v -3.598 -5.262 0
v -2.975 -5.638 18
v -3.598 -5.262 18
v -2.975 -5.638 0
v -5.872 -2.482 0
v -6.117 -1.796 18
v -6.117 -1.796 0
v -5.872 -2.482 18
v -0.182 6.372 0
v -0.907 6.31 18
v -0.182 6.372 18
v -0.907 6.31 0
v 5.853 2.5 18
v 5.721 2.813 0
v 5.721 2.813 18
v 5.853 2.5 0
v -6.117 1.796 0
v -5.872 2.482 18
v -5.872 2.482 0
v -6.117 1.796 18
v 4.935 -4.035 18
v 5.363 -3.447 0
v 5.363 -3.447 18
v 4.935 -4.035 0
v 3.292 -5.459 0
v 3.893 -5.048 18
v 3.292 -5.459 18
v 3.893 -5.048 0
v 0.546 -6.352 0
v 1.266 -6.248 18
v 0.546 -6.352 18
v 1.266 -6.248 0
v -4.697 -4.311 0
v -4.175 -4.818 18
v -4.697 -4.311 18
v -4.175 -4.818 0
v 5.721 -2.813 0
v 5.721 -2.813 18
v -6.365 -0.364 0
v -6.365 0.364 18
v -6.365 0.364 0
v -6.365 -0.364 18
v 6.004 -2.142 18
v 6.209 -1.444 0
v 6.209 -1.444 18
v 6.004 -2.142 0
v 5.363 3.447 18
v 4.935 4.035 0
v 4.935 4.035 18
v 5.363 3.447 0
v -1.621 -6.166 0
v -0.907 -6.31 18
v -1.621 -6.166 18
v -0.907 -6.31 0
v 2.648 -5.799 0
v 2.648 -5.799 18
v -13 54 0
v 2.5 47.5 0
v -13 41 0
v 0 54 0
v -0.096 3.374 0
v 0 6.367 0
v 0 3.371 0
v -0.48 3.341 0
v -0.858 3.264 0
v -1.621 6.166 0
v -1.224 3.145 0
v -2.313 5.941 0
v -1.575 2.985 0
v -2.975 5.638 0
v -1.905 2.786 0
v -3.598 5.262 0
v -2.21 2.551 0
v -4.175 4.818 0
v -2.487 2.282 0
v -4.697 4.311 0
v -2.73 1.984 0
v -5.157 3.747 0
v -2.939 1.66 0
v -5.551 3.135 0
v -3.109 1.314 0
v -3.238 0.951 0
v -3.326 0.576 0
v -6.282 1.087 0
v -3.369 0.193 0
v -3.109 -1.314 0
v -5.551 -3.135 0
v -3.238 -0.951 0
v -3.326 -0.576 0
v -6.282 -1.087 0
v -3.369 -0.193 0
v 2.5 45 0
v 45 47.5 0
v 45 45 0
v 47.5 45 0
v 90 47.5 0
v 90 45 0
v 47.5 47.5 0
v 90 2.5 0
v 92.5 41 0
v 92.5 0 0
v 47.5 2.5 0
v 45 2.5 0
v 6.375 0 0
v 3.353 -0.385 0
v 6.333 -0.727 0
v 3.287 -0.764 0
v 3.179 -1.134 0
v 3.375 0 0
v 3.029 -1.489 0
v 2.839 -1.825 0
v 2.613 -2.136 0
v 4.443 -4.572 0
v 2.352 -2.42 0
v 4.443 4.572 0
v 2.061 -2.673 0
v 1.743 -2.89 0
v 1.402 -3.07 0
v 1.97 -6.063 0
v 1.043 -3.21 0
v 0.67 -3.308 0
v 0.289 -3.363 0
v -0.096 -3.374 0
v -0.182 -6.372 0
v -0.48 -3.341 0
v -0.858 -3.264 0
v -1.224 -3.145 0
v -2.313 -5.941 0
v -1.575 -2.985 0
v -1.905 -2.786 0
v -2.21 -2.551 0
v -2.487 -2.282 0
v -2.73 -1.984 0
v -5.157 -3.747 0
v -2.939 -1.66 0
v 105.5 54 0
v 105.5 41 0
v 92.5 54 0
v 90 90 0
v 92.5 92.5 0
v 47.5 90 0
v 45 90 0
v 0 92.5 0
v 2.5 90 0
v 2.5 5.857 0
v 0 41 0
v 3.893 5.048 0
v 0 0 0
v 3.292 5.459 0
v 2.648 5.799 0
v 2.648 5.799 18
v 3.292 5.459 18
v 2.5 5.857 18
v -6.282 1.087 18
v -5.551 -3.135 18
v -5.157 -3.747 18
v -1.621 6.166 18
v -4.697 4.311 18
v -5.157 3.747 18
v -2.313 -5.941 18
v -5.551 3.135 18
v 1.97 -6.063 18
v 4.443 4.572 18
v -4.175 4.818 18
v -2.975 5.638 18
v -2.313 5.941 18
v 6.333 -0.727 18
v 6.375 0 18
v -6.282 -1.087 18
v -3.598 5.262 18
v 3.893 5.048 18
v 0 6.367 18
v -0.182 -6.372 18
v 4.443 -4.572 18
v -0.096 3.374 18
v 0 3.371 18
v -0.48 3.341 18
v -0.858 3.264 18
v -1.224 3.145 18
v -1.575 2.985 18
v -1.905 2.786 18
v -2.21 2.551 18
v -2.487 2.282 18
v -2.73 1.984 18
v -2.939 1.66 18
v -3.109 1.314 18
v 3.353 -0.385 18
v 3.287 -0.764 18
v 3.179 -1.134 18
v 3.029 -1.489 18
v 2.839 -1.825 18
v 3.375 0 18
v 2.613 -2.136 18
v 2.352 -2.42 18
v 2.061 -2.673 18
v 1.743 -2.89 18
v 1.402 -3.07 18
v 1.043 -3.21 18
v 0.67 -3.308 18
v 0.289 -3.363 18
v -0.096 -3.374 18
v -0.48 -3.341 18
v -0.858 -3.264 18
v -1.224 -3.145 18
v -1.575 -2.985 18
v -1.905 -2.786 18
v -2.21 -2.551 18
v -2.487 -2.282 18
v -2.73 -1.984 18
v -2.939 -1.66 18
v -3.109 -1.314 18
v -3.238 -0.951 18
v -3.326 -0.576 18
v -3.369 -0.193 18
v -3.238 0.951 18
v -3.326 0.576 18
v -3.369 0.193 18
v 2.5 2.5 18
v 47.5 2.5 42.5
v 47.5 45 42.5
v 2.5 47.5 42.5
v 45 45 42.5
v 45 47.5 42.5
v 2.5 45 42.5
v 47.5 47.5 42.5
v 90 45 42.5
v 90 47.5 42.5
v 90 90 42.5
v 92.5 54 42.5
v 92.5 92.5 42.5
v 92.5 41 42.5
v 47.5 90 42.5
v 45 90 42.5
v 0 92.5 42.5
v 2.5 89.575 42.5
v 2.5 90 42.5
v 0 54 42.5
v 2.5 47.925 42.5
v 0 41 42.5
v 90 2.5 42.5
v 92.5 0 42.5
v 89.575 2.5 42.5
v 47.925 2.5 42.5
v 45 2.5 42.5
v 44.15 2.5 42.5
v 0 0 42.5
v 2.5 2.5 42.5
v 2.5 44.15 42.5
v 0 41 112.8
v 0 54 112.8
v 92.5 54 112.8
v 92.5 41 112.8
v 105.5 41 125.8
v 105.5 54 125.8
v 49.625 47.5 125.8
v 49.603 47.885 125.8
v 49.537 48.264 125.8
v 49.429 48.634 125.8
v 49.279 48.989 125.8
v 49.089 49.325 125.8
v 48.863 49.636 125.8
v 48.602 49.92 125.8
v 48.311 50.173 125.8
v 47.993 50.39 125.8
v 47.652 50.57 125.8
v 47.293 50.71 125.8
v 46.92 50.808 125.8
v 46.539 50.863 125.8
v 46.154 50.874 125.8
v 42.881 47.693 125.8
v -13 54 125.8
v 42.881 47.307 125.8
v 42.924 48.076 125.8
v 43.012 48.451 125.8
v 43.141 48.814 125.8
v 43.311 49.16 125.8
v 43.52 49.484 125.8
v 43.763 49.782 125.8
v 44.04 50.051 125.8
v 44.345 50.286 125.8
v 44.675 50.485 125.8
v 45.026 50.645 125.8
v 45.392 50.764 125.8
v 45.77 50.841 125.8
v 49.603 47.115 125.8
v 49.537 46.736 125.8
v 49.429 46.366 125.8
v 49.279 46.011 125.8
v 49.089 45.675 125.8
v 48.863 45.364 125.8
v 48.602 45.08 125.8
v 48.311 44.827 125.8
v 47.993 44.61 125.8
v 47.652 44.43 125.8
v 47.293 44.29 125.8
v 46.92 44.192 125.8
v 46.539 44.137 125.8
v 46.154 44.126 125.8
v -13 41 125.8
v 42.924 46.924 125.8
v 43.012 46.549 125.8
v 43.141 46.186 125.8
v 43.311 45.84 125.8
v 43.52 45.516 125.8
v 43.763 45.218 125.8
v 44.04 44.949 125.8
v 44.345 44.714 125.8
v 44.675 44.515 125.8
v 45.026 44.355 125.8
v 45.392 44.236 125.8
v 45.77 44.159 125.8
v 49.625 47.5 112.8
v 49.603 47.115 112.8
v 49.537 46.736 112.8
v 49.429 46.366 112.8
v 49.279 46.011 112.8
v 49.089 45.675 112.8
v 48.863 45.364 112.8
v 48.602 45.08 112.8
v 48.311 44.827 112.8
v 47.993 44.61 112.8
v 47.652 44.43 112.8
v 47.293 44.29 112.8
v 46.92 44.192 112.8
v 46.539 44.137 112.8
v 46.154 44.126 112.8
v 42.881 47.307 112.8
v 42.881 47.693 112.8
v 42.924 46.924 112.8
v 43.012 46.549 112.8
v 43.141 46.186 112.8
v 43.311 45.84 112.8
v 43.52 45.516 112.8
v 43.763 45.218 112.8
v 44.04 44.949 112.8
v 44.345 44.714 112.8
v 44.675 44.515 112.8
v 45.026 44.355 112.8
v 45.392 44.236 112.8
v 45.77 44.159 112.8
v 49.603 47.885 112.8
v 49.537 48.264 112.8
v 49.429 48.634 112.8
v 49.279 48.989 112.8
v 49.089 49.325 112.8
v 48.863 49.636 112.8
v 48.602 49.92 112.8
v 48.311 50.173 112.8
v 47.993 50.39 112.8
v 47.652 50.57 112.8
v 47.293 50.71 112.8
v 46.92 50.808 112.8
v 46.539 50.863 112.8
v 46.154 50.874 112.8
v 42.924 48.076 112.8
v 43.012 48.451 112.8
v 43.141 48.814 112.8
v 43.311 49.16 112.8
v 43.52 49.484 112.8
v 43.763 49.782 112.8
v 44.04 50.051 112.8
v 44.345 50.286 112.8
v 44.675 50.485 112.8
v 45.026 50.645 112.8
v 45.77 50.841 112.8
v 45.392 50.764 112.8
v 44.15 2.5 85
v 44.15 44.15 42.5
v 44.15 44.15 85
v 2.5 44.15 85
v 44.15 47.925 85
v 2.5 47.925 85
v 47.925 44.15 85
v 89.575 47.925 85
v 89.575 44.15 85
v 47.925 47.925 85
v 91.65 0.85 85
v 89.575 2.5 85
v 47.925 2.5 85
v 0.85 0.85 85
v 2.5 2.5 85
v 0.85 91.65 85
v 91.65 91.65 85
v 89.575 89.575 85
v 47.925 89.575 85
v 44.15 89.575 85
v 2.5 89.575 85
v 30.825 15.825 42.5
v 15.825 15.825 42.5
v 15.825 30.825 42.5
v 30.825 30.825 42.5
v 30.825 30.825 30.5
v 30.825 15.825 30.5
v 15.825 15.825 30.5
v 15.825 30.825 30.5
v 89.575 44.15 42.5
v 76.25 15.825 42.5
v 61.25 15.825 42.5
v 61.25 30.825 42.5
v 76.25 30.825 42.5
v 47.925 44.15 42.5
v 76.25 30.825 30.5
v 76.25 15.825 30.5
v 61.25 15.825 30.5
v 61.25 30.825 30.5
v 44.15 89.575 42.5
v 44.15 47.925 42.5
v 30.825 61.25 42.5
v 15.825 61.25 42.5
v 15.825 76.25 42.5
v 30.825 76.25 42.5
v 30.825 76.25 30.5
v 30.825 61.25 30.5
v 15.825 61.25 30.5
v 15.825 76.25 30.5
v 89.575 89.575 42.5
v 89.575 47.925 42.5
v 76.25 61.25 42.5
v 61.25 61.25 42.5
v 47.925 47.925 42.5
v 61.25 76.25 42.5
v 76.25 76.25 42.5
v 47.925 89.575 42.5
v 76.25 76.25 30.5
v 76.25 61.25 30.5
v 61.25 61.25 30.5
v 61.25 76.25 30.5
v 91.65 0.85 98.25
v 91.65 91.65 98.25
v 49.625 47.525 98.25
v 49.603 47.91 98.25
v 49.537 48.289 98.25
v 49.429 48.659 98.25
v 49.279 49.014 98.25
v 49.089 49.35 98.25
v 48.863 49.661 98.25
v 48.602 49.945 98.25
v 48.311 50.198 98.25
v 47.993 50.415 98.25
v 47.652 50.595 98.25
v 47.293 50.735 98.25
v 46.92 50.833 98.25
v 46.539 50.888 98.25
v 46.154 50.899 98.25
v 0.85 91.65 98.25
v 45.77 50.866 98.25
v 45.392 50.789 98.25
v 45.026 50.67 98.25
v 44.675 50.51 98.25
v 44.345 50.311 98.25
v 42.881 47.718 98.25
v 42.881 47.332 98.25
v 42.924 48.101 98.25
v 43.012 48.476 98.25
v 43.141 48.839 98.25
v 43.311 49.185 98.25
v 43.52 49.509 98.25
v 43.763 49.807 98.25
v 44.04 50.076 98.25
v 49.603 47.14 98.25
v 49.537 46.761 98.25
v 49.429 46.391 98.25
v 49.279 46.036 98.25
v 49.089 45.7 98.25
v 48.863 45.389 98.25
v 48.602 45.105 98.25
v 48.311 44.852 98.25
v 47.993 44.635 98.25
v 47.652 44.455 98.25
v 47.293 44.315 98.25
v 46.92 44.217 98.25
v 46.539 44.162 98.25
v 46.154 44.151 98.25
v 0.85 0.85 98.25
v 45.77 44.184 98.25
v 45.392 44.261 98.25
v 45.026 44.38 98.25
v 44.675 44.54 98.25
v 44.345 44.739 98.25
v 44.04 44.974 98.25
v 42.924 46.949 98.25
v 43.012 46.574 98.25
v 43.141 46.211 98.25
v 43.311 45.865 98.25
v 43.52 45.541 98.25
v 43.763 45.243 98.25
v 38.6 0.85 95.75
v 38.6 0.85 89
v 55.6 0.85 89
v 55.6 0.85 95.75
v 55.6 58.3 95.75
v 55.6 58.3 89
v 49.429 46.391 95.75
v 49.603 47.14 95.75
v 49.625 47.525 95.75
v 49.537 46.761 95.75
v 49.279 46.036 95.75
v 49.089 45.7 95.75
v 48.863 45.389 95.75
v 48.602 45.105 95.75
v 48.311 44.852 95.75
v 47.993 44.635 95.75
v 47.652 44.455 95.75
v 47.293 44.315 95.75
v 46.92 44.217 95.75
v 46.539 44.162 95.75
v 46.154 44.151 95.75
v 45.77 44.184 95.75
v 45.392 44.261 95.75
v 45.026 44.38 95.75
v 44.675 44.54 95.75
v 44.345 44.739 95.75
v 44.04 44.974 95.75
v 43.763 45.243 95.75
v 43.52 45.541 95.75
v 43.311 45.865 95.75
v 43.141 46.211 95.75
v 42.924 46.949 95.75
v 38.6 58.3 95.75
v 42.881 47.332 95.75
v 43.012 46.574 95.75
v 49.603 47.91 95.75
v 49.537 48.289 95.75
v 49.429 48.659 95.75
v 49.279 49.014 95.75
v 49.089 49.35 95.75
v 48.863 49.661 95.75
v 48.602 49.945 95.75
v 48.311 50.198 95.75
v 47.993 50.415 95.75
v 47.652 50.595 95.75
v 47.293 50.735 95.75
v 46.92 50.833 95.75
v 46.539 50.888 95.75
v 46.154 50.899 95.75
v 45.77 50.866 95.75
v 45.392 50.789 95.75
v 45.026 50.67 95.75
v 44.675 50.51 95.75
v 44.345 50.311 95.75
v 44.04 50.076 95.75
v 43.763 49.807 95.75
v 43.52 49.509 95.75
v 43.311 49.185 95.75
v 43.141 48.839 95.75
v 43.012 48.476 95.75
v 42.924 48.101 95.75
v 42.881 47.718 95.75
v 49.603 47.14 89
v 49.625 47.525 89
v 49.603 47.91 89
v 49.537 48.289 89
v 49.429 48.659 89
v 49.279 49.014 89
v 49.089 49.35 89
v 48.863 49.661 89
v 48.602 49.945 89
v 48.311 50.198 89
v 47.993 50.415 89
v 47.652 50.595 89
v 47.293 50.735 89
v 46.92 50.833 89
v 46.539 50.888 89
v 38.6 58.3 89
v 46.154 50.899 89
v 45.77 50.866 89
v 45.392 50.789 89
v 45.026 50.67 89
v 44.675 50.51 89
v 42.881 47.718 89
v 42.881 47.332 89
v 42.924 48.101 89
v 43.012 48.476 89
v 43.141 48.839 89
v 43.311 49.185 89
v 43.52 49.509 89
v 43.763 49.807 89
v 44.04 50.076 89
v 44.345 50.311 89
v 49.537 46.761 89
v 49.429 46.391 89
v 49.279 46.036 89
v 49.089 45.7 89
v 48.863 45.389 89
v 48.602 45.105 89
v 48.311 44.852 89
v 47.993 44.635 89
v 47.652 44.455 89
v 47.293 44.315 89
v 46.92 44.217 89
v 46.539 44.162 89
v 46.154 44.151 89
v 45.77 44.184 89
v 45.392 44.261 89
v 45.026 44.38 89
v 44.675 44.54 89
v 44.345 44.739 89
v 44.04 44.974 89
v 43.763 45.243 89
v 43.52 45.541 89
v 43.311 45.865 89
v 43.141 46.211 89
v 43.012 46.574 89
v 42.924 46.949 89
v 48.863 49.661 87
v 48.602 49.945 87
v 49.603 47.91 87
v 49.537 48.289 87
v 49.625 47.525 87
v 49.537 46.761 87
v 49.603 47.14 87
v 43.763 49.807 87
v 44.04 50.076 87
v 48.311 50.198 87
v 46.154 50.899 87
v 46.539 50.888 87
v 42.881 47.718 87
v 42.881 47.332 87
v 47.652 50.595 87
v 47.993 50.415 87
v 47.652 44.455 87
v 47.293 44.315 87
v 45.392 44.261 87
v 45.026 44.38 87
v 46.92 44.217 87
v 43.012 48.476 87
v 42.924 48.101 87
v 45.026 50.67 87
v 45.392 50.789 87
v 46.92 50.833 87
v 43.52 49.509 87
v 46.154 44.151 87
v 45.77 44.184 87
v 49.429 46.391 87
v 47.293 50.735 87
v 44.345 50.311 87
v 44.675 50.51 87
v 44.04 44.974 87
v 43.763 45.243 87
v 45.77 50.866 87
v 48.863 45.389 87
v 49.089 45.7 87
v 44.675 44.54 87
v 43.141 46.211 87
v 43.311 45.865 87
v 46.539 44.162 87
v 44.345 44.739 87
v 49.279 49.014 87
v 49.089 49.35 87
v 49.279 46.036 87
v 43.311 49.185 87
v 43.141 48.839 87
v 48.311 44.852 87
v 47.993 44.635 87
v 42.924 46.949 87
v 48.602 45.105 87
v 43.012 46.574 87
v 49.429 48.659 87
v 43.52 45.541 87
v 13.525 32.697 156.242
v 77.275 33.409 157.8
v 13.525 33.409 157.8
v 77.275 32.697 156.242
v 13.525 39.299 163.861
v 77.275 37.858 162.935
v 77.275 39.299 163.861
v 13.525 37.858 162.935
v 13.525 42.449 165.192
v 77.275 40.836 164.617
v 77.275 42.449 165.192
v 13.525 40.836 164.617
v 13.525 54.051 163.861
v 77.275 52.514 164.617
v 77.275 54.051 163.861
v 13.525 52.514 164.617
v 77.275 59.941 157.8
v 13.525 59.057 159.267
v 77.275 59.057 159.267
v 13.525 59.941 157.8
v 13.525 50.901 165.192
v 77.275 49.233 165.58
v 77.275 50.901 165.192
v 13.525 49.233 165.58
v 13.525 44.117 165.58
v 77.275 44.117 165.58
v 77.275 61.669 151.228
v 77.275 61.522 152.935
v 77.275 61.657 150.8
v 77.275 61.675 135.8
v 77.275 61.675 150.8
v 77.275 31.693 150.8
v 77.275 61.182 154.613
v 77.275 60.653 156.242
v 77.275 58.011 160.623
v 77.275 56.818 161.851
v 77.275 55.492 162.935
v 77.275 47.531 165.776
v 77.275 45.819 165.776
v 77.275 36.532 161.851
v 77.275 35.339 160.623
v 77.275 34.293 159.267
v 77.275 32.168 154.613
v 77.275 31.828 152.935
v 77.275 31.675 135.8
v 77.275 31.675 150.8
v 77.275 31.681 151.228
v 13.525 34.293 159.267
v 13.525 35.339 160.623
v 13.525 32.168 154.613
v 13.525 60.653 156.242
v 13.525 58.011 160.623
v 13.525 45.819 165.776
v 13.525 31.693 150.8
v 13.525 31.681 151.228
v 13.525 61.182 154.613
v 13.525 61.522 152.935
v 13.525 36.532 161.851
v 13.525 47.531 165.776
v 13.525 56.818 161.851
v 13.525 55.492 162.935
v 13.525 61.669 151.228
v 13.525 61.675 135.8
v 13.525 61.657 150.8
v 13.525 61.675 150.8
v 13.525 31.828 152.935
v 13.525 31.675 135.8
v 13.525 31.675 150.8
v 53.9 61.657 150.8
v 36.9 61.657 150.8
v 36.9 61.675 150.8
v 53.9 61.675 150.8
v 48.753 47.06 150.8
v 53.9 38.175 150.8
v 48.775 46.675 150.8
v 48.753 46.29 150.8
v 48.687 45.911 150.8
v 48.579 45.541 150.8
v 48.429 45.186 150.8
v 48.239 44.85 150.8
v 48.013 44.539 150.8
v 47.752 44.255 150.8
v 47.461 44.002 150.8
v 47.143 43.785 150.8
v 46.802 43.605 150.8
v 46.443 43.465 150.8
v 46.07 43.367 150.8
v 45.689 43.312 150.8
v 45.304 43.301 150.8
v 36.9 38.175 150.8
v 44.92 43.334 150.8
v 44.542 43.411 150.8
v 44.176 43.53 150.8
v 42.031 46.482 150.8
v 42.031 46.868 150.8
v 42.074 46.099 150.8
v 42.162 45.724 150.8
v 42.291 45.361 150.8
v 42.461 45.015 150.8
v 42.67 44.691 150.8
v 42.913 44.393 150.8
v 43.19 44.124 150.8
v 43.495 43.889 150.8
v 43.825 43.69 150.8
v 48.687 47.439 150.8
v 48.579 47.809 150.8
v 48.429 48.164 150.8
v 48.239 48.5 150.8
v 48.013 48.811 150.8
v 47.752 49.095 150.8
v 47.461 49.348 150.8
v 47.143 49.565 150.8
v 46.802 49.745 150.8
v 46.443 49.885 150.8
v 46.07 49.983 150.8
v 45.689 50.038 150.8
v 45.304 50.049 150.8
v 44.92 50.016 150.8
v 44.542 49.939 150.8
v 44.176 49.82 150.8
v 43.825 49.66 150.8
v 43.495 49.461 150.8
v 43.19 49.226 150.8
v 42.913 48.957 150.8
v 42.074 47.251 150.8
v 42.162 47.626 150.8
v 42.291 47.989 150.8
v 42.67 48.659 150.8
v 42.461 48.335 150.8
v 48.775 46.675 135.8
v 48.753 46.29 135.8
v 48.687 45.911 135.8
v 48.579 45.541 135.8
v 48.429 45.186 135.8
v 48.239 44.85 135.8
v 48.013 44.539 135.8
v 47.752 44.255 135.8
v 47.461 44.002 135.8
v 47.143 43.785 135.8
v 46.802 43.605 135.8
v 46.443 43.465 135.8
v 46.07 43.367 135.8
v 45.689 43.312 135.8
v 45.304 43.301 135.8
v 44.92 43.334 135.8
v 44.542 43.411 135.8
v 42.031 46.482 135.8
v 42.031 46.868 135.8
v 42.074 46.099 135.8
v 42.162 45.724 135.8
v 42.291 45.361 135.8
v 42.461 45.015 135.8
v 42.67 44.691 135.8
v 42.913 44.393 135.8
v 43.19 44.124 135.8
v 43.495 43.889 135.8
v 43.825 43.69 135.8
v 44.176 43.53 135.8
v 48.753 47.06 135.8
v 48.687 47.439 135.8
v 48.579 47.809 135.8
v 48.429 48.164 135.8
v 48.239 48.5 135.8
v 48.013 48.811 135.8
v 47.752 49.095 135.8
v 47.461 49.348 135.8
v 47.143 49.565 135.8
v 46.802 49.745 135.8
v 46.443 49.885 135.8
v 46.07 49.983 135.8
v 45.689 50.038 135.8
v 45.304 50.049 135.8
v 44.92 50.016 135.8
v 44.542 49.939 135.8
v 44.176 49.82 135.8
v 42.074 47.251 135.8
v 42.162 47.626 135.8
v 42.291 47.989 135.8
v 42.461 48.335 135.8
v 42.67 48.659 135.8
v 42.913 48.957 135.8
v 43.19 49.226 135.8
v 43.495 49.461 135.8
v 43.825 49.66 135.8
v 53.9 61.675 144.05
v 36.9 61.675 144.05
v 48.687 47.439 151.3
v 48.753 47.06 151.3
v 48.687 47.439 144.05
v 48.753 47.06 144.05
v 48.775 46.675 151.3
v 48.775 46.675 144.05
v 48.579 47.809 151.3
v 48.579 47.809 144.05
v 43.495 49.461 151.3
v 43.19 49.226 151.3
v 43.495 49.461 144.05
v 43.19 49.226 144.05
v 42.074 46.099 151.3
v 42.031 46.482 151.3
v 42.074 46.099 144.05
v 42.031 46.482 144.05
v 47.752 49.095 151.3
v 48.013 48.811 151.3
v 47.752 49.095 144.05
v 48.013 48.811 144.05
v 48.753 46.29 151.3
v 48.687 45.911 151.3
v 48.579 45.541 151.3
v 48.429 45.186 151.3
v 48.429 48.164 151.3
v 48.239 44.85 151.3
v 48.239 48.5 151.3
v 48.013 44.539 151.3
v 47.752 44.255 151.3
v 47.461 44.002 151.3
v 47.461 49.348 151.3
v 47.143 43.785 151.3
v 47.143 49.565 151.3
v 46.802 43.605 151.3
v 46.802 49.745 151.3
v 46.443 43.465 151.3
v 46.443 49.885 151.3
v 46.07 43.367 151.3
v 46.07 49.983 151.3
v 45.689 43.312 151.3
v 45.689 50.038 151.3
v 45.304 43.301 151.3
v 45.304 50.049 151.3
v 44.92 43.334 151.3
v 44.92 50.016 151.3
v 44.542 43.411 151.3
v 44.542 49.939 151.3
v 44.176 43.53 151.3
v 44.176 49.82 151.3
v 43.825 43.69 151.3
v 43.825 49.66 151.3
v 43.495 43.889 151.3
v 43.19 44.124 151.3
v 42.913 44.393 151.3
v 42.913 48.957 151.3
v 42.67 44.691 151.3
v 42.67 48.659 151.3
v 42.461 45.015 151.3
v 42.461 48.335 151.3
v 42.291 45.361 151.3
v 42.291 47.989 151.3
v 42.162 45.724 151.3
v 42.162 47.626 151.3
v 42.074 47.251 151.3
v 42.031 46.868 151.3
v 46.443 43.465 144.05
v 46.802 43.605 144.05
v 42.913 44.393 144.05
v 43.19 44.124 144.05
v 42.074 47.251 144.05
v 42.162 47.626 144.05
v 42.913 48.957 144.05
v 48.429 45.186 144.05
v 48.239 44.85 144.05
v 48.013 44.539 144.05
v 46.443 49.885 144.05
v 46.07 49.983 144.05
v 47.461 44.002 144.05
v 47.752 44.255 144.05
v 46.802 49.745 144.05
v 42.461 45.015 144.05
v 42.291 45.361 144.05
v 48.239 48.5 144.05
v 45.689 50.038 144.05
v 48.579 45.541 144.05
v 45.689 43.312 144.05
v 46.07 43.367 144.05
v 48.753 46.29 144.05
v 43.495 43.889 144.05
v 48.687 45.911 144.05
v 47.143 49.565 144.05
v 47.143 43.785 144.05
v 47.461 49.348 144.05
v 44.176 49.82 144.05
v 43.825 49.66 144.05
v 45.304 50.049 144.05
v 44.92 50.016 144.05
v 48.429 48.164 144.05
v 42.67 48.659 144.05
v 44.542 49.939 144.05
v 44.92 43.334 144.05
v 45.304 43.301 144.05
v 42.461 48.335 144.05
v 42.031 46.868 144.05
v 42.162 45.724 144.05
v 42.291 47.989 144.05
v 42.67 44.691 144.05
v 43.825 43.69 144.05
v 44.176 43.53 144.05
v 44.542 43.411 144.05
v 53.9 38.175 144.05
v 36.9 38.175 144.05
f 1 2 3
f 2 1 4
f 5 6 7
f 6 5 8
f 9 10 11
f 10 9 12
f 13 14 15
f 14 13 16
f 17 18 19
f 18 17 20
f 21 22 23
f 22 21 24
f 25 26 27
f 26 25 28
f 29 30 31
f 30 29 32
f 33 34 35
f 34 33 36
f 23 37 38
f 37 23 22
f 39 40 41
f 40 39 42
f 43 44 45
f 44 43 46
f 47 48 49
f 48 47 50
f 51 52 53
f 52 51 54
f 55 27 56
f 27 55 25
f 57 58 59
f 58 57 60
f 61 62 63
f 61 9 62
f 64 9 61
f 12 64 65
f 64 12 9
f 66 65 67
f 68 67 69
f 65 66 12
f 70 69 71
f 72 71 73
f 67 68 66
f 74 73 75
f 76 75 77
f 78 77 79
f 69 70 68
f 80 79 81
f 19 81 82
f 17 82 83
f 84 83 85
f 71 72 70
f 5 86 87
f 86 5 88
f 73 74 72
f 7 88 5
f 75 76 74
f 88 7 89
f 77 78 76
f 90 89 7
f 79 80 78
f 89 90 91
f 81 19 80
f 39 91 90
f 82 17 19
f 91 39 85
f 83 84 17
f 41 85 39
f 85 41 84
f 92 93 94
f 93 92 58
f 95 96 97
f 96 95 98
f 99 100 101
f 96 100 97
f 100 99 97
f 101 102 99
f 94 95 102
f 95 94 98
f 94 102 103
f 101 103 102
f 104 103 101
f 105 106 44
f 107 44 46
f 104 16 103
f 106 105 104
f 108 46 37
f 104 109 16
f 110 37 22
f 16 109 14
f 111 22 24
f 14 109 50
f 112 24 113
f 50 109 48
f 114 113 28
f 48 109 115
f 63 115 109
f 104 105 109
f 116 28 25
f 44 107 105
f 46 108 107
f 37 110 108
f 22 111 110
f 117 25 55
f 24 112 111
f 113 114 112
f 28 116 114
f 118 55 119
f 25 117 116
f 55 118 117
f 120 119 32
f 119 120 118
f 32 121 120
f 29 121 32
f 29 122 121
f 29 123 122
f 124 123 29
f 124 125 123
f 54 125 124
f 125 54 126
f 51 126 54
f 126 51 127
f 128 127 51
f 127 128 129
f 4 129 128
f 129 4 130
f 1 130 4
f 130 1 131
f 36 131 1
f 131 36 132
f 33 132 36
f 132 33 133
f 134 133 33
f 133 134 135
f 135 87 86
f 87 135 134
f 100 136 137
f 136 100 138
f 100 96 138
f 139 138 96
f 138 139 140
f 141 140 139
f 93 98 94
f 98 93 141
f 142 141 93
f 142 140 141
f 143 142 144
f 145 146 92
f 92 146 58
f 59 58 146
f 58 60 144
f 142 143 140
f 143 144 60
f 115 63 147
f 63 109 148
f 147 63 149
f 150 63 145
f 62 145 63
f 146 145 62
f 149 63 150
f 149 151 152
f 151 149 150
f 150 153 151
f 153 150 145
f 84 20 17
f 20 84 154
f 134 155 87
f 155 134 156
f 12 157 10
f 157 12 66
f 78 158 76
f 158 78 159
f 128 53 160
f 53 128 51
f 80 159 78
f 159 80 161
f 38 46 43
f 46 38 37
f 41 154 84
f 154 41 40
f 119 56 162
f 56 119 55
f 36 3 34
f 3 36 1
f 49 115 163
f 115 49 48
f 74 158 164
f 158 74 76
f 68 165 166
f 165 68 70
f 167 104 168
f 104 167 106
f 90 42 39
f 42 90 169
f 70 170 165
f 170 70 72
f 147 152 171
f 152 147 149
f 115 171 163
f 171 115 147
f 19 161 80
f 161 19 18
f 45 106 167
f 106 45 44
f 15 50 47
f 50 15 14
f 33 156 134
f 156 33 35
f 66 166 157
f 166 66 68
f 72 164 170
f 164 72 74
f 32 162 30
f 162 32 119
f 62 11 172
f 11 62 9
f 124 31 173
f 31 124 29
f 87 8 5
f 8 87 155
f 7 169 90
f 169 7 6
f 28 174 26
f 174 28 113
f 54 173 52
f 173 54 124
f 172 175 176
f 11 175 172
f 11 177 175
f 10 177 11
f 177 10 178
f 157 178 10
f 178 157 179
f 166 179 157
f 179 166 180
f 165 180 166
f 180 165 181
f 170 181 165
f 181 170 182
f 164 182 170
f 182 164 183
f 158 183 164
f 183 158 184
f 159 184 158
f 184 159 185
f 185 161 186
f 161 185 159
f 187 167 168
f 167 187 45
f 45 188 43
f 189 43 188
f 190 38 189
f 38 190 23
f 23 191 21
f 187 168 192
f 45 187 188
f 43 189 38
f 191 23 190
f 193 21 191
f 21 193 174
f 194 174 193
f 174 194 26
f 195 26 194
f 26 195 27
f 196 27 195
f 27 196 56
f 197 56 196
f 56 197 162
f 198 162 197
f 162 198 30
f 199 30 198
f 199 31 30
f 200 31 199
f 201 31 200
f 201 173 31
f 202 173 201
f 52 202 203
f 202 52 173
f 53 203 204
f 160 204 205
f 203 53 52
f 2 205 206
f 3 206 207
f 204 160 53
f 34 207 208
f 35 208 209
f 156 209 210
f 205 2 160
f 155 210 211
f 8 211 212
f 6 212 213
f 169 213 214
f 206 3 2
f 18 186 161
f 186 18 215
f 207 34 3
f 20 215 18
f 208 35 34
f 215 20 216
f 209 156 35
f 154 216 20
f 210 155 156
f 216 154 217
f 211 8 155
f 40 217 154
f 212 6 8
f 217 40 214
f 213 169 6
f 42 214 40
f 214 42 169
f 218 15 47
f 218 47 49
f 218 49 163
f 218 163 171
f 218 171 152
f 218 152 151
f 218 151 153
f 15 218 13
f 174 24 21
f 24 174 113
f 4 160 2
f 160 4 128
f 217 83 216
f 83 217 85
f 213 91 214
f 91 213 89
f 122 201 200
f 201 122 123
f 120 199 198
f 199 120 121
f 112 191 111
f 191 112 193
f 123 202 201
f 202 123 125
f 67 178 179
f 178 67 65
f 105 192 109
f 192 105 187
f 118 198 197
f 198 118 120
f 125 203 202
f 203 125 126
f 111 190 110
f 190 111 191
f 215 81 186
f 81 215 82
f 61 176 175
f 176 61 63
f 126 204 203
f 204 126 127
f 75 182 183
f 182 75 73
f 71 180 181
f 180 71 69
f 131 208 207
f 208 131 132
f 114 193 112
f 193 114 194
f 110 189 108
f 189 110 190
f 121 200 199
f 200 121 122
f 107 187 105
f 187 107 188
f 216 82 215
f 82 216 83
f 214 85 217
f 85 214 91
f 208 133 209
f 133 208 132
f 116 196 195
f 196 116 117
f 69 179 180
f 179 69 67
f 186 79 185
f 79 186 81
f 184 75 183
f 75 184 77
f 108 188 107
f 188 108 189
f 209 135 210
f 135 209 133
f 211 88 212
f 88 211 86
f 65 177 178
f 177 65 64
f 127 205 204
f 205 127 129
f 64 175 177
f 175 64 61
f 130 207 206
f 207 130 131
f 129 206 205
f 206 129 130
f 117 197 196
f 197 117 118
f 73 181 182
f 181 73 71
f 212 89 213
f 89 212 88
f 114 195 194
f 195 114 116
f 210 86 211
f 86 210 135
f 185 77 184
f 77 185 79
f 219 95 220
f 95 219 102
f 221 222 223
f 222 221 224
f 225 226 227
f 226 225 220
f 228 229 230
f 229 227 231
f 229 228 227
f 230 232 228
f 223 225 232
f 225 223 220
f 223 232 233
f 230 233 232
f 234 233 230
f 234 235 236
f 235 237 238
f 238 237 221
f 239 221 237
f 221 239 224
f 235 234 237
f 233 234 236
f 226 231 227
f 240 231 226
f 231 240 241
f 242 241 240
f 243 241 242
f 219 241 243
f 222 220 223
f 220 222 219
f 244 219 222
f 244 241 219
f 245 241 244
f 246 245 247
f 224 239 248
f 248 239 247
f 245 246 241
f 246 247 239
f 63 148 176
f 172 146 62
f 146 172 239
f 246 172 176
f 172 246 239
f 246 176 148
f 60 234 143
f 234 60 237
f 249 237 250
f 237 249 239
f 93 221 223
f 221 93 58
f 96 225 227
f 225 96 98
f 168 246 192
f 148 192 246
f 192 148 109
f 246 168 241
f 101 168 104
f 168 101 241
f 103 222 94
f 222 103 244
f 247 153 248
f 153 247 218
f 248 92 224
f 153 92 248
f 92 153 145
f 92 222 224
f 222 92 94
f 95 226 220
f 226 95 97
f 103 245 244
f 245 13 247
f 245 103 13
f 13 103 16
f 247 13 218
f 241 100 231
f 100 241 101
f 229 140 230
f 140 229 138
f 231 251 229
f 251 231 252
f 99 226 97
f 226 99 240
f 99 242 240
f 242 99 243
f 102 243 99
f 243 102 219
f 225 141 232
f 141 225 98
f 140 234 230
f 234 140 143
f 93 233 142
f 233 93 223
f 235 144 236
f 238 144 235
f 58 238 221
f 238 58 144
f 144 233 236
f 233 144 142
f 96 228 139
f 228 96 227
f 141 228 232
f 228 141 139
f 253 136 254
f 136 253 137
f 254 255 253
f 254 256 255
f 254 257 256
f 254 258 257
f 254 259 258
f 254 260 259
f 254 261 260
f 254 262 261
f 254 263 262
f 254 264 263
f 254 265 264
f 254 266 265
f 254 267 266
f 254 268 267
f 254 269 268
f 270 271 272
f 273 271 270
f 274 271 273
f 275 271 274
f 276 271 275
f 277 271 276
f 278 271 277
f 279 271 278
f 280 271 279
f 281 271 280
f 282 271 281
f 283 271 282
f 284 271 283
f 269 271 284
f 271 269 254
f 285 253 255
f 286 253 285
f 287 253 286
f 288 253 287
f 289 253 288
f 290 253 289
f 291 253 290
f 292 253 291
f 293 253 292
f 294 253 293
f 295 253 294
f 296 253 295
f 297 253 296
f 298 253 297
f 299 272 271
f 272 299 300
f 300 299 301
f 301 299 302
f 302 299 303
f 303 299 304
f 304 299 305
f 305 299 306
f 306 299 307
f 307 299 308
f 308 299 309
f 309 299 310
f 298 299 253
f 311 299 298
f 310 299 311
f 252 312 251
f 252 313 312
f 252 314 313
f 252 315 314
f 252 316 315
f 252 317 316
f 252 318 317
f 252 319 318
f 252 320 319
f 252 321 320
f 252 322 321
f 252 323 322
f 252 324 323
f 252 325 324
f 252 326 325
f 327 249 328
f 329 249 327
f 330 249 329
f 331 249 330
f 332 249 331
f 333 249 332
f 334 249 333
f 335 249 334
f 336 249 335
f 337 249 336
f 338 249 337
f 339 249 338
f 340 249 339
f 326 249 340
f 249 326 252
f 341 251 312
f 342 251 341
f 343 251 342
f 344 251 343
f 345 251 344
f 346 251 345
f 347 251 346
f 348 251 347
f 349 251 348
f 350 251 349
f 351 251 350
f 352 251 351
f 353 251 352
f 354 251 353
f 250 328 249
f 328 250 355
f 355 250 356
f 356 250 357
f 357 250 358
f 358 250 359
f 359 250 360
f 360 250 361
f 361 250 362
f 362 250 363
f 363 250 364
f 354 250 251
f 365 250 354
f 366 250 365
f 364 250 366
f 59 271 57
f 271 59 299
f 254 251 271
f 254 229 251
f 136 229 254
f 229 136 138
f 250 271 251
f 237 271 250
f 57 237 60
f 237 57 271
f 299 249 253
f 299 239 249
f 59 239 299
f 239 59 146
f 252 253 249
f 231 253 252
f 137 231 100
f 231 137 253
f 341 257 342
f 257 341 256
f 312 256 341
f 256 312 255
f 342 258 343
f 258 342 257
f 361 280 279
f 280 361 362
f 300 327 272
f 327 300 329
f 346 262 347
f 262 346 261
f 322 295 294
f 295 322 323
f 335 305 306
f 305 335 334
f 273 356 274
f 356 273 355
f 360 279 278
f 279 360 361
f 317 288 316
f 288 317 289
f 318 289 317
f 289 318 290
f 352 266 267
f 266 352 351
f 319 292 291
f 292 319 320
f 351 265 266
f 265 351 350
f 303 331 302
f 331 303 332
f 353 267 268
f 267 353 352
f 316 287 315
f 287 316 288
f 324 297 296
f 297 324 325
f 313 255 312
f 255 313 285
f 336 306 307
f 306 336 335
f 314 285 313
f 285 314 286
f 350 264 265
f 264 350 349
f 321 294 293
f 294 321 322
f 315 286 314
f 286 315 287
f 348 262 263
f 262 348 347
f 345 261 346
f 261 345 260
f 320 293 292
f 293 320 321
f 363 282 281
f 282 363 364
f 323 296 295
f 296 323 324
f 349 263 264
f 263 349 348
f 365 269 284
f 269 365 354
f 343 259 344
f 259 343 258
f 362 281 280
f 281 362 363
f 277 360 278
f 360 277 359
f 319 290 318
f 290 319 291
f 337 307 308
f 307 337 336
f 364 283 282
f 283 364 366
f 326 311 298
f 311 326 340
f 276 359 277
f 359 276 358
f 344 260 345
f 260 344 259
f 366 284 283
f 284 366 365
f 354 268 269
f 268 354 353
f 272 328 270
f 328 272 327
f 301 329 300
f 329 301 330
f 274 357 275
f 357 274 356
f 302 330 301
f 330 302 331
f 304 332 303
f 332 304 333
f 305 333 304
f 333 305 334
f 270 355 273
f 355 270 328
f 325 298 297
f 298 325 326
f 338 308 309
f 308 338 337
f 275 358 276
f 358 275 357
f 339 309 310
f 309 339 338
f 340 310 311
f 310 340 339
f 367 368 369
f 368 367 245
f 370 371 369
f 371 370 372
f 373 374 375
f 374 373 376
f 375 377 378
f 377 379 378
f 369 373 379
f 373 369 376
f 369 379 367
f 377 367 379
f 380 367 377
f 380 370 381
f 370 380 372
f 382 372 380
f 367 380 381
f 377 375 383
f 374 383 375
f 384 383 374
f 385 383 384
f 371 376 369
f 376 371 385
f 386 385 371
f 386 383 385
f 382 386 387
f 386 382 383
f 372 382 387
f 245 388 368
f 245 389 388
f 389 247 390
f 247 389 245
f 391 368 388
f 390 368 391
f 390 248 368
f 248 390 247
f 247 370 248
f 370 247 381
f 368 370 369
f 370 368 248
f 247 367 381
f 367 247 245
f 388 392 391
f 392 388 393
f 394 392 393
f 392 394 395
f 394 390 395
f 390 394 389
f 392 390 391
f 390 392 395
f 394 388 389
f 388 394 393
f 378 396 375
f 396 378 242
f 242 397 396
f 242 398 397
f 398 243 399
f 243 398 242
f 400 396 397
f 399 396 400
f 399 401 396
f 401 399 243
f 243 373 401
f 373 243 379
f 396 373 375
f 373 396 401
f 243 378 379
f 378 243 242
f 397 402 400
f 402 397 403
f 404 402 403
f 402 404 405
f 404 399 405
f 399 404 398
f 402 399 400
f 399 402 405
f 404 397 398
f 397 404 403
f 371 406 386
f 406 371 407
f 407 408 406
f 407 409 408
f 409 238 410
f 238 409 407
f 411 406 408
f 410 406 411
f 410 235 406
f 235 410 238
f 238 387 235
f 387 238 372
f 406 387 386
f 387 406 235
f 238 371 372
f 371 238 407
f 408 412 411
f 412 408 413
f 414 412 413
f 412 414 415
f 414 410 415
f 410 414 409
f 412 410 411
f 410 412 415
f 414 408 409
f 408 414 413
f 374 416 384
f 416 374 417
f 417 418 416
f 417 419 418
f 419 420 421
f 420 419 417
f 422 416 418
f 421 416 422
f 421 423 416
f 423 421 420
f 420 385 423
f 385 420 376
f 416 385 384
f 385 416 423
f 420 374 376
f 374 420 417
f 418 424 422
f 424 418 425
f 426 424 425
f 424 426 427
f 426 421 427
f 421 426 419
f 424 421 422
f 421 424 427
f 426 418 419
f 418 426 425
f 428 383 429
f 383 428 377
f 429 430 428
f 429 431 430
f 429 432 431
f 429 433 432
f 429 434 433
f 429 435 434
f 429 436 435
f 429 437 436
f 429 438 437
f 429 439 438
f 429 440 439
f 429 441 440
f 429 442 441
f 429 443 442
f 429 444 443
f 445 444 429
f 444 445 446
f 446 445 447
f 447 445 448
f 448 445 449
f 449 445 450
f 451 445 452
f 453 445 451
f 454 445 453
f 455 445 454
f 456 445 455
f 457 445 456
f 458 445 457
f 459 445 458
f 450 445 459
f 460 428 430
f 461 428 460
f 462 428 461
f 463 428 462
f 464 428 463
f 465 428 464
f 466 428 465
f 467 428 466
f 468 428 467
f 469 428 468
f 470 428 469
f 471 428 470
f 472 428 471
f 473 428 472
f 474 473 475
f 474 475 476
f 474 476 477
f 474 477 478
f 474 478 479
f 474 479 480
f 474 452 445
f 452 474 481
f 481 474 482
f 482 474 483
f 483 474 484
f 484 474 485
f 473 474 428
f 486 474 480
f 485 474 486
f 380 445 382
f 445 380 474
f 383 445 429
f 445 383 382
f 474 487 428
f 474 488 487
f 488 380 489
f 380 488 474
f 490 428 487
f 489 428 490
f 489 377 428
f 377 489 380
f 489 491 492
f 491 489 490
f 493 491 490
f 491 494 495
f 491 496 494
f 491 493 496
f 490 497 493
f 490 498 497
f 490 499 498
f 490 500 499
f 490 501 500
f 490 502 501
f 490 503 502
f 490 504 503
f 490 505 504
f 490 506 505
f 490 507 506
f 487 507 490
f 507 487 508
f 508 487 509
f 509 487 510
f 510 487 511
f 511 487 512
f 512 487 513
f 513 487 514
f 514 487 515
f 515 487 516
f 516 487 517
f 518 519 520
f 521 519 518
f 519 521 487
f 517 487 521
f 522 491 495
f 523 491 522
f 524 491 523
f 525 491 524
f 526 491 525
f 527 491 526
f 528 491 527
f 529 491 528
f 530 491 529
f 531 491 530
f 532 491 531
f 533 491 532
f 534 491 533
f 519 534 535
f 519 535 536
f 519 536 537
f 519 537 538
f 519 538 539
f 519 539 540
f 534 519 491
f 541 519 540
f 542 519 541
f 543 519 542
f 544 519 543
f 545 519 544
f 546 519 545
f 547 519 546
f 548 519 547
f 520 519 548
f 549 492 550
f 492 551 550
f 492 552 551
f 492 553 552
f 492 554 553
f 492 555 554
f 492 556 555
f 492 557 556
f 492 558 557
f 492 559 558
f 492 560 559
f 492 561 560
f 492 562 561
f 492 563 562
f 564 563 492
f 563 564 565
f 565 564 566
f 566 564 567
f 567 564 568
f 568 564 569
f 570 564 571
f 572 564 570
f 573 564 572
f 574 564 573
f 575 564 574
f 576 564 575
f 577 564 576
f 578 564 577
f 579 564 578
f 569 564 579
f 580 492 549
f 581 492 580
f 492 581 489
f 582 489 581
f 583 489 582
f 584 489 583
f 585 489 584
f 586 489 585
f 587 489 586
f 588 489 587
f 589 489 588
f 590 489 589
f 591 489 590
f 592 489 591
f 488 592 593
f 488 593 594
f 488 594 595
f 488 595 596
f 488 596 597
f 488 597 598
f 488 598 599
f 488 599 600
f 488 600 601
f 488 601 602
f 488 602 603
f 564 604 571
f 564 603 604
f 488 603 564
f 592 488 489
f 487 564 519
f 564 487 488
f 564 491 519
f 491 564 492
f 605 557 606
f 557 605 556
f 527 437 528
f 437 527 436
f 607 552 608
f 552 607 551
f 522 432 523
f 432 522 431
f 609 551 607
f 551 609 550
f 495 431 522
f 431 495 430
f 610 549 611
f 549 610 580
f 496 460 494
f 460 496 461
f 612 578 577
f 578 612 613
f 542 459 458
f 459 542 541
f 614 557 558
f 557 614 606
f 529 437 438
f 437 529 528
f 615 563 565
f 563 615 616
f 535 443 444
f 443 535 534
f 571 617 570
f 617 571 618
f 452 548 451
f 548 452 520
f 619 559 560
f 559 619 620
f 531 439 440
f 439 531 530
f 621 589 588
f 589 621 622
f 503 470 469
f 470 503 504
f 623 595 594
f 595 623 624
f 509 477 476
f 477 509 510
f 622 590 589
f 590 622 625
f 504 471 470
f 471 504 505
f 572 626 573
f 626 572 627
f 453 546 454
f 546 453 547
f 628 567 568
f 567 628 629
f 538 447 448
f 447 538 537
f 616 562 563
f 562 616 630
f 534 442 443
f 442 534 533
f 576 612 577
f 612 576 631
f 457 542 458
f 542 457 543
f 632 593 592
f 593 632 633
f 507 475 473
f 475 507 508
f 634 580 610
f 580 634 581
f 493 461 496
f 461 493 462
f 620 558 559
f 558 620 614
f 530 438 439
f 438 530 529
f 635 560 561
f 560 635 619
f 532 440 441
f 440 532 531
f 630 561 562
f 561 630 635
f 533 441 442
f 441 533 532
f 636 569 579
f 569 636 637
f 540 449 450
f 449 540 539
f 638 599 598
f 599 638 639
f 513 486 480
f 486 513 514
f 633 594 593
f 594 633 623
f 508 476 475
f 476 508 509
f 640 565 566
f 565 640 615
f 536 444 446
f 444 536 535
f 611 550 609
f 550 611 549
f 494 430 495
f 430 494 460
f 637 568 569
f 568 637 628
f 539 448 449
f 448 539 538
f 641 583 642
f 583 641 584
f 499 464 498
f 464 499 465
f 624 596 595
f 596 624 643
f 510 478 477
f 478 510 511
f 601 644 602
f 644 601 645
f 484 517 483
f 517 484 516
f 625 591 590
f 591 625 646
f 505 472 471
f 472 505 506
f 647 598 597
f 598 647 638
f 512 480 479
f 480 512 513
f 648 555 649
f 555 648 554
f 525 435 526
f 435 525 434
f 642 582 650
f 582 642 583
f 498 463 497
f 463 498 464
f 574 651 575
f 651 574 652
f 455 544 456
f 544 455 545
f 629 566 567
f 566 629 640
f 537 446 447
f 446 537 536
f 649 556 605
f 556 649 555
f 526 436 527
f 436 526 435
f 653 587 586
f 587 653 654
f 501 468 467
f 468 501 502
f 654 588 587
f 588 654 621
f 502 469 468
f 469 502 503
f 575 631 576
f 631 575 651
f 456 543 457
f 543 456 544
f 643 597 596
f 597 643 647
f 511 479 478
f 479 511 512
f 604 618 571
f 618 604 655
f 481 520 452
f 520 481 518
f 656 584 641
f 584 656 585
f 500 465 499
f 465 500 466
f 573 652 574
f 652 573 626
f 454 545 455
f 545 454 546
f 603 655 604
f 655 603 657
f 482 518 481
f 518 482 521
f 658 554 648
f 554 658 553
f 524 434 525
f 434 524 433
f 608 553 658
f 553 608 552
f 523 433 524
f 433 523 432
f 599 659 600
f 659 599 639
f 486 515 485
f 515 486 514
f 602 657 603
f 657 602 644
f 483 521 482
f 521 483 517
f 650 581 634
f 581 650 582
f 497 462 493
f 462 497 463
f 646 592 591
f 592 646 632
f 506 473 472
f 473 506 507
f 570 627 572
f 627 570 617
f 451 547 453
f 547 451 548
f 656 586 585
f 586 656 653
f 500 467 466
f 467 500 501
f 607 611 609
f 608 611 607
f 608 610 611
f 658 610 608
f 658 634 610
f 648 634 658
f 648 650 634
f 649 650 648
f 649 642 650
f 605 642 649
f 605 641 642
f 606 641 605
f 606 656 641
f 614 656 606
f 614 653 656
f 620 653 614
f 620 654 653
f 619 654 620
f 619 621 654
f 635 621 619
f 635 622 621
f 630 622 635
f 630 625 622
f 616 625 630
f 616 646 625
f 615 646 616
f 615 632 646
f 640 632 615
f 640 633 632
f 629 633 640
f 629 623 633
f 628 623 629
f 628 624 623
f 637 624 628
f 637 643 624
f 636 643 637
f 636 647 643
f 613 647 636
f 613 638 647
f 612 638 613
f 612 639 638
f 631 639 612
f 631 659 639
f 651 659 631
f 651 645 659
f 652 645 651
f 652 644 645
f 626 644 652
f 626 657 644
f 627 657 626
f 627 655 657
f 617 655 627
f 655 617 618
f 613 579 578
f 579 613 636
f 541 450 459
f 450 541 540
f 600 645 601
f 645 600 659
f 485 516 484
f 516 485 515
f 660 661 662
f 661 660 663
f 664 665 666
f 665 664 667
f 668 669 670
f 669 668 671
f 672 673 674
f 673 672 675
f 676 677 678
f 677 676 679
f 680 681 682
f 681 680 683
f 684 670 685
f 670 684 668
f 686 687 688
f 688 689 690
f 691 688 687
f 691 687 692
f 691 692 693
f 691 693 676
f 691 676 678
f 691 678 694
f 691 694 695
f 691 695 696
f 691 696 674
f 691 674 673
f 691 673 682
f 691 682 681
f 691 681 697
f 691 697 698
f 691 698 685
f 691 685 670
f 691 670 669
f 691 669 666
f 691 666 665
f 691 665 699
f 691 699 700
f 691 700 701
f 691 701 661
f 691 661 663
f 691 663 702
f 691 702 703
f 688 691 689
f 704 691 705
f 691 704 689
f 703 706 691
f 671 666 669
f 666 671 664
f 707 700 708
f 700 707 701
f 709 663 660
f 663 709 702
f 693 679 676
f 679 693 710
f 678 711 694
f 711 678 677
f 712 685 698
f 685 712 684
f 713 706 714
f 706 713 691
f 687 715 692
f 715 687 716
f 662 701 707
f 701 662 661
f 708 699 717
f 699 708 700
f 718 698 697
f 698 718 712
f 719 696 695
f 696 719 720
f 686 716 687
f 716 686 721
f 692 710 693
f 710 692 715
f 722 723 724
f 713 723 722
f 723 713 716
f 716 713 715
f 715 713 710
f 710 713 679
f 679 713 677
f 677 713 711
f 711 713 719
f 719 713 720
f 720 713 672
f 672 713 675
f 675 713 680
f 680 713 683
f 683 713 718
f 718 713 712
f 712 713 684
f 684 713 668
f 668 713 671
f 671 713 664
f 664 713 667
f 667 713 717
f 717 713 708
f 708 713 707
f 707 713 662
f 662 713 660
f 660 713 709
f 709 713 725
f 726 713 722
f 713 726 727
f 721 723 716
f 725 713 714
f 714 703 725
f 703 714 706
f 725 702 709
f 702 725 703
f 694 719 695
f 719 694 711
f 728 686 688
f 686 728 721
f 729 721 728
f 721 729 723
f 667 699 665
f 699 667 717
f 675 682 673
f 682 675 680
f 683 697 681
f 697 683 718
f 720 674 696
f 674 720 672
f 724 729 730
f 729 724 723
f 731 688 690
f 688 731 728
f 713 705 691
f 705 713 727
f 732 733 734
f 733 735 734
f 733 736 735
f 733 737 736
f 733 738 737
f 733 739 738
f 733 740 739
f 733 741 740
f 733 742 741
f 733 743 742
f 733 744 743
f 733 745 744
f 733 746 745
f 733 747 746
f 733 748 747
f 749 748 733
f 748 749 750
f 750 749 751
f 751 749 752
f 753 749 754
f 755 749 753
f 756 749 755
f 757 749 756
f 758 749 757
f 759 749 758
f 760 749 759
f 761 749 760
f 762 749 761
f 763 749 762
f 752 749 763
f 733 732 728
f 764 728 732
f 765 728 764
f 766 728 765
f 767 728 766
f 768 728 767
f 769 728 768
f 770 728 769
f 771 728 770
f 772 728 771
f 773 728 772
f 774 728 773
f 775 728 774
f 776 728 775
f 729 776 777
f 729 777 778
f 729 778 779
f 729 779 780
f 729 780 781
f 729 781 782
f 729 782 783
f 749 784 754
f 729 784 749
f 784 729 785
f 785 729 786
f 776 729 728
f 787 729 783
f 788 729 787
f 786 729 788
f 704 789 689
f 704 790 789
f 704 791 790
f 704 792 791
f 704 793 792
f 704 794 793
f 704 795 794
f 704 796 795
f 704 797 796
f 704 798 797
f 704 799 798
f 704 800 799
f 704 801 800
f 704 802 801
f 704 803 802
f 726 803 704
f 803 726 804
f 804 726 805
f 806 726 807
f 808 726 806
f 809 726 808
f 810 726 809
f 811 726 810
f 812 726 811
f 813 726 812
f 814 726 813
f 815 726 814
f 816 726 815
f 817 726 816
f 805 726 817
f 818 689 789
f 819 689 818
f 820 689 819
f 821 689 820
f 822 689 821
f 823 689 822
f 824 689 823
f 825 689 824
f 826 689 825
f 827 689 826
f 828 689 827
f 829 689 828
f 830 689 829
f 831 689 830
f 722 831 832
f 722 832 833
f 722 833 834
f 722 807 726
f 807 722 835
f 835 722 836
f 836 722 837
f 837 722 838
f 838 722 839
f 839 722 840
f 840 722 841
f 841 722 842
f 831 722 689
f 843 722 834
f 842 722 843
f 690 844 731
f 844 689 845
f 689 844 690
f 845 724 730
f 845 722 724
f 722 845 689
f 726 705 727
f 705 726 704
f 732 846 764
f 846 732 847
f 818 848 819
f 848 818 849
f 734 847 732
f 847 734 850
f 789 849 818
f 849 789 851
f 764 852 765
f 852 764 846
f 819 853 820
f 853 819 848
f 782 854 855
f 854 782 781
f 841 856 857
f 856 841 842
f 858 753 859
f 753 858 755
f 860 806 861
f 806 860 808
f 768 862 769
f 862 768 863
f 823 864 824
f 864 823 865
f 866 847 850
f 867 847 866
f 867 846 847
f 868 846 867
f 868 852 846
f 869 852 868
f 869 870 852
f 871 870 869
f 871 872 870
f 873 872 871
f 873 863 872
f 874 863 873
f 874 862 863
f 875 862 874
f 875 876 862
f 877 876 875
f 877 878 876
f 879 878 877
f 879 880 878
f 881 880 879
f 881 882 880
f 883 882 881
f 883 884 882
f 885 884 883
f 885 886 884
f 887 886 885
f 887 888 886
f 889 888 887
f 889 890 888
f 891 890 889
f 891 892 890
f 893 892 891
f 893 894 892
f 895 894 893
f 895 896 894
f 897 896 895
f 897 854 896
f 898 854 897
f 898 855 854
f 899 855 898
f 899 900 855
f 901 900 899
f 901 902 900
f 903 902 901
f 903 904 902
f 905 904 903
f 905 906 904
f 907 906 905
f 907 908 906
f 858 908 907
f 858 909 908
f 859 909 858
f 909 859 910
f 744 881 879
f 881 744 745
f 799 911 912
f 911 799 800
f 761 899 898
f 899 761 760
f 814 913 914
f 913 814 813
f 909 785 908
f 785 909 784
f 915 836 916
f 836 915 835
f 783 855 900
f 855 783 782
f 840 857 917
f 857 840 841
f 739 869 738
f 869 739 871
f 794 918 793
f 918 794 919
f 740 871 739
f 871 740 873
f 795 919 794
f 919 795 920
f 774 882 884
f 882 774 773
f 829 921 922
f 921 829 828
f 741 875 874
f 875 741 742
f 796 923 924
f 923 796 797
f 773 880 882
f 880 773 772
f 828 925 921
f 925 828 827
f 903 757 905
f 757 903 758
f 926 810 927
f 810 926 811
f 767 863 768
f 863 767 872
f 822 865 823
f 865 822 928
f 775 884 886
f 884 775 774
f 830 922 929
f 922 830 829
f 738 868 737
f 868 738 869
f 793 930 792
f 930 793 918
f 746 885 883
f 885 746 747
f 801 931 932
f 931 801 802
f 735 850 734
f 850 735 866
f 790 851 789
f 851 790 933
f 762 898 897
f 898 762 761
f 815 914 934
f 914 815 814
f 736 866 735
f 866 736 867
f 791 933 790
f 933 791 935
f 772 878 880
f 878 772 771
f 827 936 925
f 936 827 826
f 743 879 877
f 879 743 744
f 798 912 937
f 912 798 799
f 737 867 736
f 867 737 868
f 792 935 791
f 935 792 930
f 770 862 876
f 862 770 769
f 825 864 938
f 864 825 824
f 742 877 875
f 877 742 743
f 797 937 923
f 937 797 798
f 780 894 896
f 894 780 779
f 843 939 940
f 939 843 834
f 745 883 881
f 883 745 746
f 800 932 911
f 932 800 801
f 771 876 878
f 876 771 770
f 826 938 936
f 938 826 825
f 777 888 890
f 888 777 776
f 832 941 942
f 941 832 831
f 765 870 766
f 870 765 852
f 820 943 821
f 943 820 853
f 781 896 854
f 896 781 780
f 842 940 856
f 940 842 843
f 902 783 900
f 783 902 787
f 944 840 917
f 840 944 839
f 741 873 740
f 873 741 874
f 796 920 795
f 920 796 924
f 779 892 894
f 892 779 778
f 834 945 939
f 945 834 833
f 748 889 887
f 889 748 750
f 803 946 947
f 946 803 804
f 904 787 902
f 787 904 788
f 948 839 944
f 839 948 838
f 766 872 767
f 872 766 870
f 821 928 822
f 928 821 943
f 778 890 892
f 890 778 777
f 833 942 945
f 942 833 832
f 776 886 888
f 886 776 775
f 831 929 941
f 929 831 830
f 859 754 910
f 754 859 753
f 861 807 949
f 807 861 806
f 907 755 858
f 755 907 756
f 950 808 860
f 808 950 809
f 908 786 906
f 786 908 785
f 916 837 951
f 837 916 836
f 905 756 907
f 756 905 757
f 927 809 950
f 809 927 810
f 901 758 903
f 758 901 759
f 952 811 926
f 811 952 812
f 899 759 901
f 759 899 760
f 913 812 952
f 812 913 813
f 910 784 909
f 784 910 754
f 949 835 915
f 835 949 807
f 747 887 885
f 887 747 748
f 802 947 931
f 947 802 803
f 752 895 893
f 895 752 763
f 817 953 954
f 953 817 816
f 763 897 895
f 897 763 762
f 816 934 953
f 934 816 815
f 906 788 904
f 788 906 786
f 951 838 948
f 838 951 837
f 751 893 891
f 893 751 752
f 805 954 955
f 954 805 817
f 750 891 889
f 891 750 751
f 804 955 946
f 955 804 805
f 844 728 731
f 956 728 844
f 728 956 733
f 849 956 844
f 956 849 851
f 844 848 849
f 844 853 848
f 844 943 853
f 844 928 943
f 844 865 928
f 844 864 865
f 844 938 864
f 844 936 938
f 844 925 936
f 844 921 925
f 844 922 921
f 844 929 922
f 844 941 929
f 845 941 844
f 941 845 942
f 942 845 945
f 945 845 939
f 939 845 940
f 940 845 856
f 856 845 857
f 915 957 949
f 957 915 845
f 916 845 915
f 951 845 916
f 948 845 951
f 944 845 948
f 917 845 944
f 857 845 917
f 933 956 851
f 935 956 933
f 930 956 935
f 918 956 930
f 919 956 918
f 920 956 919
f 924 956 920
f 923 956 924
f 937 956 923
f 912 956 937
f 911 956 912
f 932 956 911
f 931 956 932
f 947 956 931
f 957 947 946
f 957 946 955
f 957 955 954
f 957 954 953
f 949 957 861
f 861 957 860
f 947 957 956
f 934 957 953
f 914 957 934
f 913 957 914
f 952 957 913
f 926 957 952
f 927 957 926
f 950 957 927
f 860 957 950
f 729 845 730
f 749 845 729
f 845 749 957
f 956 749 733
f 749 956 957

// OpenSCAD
outerBlockX = 42.5;
innerBlockX = 15;
outerBlockZ = 42.5;
innerBlockZ = 12;

moldMargin=.85;

wallThickness = 2.5;
fingerGripPostX = 13;
fingerGripZ = outerBlockZ*2;
fingerGripThickness = fingerGripPostX;

nutZ = 6.75;
nutFlangeX = 17;

rodRad = 6.75/2;
lipZ = 4;

fingerMargin = 12;

spacer = 18;

handleRad = 15;

$fn=55;

//
spacer();

outerBlocks();
translate([0,0,outerBlockZ])
    press();

translate([outerBlockX+wallThickness*1.5-moldMargin,outerBlockX+wallThickness*1.5+moldMargin/2,fingerGripZ+lipZ+nutZ+wallThickness+moldMargin*3+fingerMargin+fingerGripThickness+25])
{
    handle();
}

//translate([outerBlockX+wallThickness+wallThickness/2,outerBlockX+wallThickness+wallThickness,outerBlockZ+outerBlockZ+lipZ])
//cylinder(r=6.35/2, h=101.6);

module handle()
{
    difference()
    {
        union(){
            rotate([0,90,0])
                cylinder(r=handleRad,h=outerBlockX*1.5,center=true);
            translate([-outerBlockX*1.5/2, -handleRad, -handleRad])
                cube([outerBlockX*1.5,handleRad*2,handleRad]);
        }
        translate([0,0,-handleRad])
        cylinder(r=rodRad,h=handleRad*2+1,center=true);
        translate([-nutFlangeX/2,-nutFlangeX/2,-nutZ])
        cube([nutFlangeX,outerBlockX+wallThickness*1.5+2+nutFlangeX/2+moldMargin*2,nutZ]);
    }
}

module press()
{
    innerMolds();
    lip();
    //translate([outerBlockX+wallThickness+wallThickness/2,outerBlockX+wallThickness+wallThickness,outerBlockZ+lipZ])
      //  translate([-(nutFlangeX+wallThickness)/2,-(nutFlangeX+wallThickness)/2,0])
        //cube([nutFlangeX+wallThickness,nutFlangeX+wallThickness,nutZ+wallThickness]);
}

module spacer()
{
    difference()
    {
        cylinder(r=rodRad+3,h=spacer);
        translate([0,0,-1])
        cylinder(r=rodRad,h=spacer+2);
    }
}

module lip()
{
    translate([moldMargin, moldMargin, outerBlockZ])
    {
        difference()
            {
            cube([outerBlockX*2+wallThickness*3 - moldMargin*2,outerBlockX*2+wallThickness*3 - moldMargin*2, lipZ+nutZ+wallThickness]);
            translate([outerBlockX+wallThickness*1.5-nutFlangeX/2,-1,lipZ])
                cube([nutFlangeX,outerBlockX+wallThickness*1.5+2+nutFlangeX/2+moldMargin*2,nutZ]);
            translate([outerBlockX+wallThickness*1.5-moldMargin,outerBlockX+wallThickness*1.5+moldMargin/2,2])
                cylinder(r=rodRad,h=fingerGripZ);
            }
            //translate([outerBlockX+wallThickness*1.5,outerBlockX+wallThickness*1.5,-lipZ-nutZ])
              //a  cylinder(r=rodRad,h=fingerGripZ);
    }
}

module innerMolds()
{
    translate([wallThickness,wallThickness,0])
        innerMold();
    translate([wallThickness+outerBlockX+moldMargin/2+wallThickness,wallThickness,0])
        innerMold();
    
    translate([wallThickness,wallThickness+outerBlockX+moldMargin/2+wallThickness,0])
        innerMold();

    translate([wallThickness+outerBlockX+moldMargin/2+wallThickness,wallThickness+outerBlockX+moldMargin/2+wallThickness,0])
        innerMold();
}

module innerMold()
{
    cube([outerBlockX-moldMargin,outerBlockX-moldMargin,outerBlockZ]);
    translate([(outerBlockX-moldMargin)/2-innerBlockX/2,(outerBlockX-moldMargin)/2-innerBlockX/2,-innerBlockZ])
    cube([innerBlockX,innerBlockX,innerBlockZ]);
}

module outerBlock()
{
    difference()
    {
        cube([outerBlockX+wallThickness*2,outerBlockX+wallThickness*2,outerBlockZ]);
        translate([wallThickness,wallThickness,-1])
            cube([outerBlockX,outerBlockX,outerBlockZ+2]);
    }
}

module outerBlocks()
{
    outerBlockRow();
    translate([0,outerBlockX+wallThickness])
        outerBlockRow();
    translate([-fingerGripPostX, outerBlockX+wallThickness*2-fingerGripPostX/2, 0]) {
        fingerGrip();
        }
}

module fingerGrip()
{
    barX = (outerBlockX+wallThickness)*2+fingerGripPostX*2+wallThickness;
    postZ = fingerGripZ+lipZ+nutZ+wallThickness+moldMargin*3+fingerMargin;

    cube([fingerGripPostX,fingerGripPostX,postZ]);
    translate([(outerBlockX+wallThickness)*2+fingerGripPostX+wallThickness,0,0])
        cube([fingerGripPostX,fingerGripPostX,postZ]);
    difference()
    {
        translate([0,0,postZ])
            cube([barX,fingerGripPostX,fingerGripThickness]);
        translate([barX/2,fingerGripPostX/2,fingerGripZ/2])
            cylinder(r=rodRad,h=fingerGripZ);

    }
}

module outerBlockRow()
{
    outerBlock();
    translate([outerBlockX+wallThickness,0,0])
        outerBlock();
    //translate([(outerBlockX+wallThickness)*2,0,0])
    //    outerBlock();
    //translate([(outerBlockX+wallThickness)*3,0,0])
      //  outerBlock();
}
